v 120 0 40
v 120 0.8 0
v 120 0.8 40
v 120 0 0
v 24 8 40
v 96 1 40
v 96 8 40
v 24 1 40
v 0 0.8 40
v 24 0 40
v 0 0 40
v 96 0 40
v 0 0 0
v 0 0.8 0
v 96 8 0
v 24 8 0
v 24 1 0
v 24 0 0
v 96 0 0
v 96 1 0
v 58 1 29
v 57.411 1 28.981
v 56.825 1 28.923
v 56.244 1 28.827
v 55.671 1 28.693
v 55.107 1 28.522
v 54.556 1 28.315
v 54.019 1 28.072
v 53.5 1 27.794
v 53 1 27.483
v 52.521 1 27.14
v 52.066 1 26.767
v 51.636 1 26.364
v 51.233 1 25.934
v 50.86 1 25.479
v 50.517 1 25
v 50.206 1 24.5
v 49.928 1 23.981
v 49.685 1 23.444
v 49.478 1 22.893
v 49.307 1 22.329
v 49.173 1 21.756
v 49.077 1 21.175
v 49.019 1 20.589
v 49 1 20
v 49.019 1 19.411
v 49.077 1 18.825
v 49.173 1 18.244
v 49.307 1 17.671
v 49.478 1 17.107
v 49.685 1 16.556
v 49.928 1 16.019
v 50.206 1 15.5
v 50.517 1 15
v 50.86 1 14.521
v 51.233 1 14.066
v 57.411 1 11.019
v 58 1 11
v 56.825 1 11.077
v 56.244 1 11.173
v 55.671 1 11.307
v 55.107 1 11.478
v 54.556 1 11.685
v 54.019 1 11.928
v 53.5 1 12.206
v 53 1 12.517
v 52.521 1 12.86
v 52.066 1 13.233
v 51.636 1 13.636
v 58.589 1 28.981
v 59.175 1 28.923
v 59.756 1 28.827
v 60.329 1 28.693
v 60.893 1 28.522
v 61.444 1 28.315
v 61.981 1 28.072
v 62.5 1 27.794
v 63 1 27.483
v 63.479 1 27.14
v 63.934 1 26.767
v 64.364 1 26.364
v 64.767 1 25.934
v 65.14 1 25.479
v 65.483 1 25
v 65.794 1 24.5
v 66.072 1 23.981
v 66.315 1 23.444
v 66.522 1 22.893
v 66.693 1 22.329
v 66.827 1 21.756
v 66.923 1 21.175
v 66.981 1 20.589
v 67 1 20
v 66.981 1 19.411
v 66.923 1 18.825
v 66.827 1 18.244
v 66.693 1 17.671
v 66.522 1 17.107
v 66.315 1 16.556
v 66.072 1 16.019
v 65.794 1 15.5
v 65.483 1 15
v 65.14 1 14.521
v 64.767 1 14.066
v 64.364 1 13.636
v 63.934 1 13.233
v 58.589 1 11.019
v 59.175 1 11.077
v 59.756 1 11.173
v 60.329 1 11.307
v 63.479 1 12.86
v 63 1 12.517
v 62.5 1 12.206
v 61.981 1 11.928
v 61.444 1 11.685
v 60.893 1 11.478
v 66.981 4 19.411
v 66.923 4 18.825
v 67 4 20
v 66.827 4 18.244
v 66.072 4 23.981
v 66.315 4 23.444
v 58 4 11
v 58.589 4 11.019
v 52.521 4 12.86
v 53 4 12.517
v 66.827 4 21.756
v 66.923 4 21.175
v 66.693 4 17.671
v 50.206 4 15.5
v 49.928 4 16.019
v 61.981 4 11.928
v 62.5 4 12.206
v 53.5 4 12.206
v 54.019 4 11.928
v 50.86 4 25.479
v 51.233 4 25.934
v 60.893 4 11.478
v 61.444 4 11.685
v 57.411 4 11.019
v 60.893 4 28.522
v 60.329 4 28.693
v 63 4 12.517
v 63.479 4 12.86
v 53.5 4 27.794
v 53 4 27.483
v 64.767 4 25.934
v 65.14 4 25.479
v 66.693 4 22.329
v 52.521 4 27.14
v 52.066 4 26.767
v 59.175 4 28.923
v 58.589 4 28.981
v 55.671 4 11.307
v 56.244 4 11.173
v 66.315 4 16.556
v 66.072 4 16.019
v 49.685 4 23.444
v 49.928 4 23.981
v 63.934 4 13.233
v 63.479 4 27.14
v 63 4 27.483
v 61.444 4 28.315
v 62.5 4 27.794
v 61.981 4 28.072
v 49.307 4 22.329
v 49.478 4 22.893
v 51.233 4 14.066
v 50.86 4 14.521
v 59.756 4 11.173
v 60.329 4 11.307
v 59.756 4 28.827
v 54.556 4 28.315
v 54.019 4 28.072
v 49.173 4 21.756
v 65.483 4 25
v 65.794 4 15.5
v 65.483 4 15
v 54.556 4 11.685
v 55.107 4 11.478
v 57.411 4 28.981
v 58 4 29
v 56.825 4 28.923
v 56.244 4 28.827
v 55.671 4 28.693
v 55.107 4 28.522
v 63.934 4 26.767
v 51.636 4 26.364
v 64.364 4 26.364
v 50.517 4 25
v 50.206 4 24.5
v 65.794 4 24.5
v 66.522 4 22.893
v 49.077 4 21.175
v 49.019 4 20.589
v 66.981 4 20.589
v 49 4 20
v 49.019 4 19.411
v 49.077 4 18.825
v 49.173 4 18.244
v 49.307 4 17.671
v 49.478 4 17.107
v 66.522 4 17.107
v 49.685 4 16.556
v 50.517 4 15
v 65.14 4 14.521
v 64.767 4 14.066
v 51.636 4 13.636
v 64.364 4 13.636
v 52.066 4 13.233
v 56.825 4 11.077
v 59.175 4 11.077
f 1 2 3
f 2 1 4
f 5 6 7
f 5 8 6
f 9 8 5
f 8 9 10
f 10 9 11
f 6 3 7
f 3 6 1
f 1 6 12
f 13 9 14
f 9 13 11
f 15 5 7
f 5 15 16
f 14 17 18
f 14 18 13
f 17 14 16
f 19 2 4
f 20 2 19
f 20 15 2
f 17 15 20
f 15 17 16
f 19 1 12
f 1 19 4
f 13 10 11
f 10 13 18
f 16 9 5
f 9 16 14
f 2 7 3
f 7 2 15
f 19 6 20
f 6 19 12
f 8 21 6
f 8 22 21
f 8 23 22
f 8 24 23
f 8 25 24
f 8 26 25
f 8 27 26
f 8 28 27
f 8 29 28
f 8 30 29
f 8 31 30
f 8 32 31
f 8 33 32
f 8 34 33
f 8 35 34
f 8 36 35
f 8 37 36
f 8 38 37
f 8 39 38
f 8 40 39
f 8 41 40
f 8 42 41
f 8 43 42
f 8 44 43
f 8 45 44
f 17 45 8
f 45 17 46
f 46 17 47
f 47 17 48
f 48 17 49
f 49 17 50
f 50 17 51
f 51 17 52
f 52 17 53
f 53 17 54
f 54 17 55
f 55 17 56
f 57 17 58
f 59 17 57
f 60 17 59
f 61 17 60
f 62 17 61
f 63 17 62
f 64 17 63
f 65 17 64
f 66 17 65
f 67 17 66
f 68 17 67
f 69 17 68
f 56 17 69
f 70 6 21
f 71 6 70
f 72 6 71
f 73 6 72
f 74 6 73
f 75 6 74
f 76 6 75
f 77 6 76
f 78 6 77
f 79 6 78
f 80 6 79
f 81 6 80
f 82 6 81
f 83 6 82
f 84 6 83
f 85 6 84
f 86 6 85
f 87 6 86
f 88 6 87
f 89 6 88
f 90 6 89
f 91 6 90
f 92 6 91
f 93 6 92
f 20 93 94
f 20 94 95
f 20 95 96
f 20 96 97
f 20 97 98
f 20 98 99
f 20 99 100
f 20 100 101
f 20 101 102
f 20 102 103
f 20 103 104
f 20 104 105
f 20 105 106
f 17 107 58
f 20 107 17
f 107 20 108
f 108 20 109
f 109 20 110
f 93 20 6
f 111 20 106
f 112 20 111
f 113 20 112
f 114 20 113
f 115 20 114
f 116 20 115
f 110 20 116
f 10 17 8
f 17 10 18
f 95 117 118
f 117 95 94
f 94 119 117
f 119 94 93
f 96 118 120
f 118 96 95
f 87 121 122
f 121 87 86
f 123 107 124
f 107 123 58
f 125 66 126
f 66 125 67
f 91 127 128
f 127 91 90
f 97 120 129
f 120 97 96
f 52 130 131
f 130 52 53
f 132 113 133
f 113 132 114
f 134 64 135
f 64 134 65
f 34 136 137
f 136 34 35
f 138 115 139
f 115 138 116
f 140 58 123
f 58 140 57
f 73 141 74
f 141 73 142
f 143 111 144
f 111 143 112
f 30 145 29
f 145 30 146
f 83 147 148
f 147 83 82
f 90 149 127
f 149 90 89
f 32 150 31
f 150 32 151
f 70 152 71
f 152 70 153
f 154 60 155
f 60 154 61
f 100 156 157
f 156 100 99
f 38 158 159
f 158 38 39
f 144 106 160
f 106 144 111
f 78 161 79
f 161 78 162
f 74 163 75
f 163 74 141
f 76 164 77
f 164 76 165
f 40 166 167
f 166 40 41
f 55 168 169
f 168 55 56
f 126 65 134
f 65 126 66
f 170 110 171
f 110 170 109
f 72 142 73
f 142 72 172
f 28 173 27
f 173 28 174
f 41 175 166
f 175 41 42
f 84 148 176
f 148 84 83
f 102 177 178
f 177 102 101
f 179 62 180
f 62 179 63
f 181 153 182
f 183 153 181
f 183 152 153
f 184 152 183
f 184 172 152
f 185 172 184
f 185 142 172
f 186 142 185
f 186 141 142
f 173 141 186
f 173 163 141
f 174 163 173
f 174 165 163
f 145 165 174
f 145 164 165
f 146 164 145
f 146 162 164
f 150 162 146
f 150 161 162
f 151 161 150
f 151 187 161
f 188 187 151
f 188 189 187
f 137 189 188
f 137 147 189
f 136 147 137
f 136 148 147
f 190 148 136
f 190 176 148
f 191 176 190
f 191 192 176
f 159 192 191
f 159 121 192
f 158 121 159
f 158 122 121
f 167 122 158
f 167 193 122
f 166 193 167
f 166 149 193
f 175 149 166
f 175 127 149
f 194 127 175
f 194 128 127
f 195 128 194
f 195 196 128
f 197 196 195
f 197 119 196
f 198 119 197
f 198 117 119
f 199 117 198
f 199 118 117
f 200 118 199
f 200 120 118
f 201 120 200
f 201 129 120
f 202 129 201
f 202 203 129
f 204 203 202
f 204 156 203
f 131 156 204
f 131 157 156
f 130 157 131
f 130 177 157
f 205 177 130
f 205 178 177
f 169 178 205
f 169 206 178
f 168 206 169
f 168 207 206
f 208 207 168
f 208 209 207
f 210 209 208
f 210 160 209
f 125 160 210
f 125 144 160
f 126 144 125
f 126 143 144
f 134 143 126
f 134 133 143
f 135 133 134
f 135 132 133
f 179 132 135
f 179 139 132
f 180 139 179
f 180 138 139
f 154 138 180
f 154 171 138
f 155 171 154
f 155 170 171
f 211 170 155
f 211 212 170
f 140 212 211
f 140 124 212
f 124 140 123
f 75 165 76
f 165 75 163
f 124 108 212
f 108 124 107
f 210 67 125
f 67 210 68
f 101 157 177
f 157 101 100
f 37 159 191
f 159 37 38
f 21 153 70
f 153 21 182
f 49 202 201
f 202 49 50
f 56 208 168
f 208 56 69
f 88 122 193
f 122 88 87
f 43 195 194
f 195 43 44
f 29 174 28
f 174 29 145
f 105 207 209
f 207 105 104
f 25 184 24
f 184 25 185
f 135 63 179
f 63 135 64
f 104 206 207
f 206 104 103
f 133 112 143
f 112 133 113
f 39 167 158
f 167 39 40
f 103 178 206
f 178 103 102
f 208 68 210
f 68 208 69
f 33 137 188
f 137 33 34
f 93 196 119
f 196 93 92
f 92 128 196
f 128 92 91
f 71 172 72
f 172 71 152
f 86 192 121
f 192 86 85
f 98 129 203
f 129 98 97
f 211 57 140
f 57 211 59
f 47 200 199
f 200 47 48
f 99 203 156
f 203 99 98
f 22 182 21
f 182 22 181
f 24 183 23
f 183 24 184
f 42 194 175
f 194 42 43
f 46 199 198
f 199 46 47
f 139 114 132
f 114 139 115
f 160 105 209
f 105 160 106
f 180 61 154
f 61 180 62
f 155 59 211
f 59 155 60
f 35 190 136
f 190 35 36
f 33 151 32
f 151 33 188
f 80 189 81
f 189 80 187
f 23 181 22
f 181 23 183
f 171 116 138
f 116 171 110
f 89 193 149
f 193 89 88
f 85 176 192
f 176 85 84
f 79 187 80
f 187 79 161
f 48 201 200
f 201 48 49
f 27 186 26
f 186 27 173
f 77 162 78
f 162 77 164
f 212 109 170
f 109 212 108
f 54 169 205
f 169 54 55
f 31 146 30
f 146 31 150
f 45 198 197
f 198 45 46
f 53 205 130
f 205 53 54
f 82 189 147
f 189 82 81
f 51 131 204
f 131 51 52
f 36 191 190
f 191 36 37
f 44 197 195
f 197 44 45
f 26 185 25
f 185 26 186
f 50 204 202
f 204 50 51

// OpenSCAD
// ÉCHANTILLON SEULEMENT — pas un seuil de circulation.
// Généré depuis parametres.json (cm). Ici les longueurs sont en mm.
// Repère local : x vers cellier/est, y vers T1/nord, z vers le haut.
largeur = 120.0; longueur = 40.0; hauteur = 8.0; bord = 0.8;
canal = 72.0; jeu_rail = 1.0; diametre_vis = 18.0; plafond_vis = 4.0;
centre_vis_x = 58.0; centre_vis_y = 20.0;
sur_tranche = true;
$fn = 96;
module echantillon() {
  difference() {
    translate([0,longueur,0]) rotate([90,0,0])
      linear_extrude(height=longueur)
        polygon([[0,0],[largeur,0],[largeur,bord],
                 [(largeur+canal)/2,hauteur],[(largeur-canal)/2,hauteur],[0,bord]]);
    translate([(largeur-canal)/2,-1,-1]) cube([canal,longueur+2,jeu_rail+1]);
    translate([centre_vis_x,centre_vis_y,-1]) cylinder(h=plafond_vis+1,d=diametre_vis);
  }
}
if (sur_tranche) translate([0,0,longueur]) rotate([-90,0,0]) echantillon();
else echantillon();
